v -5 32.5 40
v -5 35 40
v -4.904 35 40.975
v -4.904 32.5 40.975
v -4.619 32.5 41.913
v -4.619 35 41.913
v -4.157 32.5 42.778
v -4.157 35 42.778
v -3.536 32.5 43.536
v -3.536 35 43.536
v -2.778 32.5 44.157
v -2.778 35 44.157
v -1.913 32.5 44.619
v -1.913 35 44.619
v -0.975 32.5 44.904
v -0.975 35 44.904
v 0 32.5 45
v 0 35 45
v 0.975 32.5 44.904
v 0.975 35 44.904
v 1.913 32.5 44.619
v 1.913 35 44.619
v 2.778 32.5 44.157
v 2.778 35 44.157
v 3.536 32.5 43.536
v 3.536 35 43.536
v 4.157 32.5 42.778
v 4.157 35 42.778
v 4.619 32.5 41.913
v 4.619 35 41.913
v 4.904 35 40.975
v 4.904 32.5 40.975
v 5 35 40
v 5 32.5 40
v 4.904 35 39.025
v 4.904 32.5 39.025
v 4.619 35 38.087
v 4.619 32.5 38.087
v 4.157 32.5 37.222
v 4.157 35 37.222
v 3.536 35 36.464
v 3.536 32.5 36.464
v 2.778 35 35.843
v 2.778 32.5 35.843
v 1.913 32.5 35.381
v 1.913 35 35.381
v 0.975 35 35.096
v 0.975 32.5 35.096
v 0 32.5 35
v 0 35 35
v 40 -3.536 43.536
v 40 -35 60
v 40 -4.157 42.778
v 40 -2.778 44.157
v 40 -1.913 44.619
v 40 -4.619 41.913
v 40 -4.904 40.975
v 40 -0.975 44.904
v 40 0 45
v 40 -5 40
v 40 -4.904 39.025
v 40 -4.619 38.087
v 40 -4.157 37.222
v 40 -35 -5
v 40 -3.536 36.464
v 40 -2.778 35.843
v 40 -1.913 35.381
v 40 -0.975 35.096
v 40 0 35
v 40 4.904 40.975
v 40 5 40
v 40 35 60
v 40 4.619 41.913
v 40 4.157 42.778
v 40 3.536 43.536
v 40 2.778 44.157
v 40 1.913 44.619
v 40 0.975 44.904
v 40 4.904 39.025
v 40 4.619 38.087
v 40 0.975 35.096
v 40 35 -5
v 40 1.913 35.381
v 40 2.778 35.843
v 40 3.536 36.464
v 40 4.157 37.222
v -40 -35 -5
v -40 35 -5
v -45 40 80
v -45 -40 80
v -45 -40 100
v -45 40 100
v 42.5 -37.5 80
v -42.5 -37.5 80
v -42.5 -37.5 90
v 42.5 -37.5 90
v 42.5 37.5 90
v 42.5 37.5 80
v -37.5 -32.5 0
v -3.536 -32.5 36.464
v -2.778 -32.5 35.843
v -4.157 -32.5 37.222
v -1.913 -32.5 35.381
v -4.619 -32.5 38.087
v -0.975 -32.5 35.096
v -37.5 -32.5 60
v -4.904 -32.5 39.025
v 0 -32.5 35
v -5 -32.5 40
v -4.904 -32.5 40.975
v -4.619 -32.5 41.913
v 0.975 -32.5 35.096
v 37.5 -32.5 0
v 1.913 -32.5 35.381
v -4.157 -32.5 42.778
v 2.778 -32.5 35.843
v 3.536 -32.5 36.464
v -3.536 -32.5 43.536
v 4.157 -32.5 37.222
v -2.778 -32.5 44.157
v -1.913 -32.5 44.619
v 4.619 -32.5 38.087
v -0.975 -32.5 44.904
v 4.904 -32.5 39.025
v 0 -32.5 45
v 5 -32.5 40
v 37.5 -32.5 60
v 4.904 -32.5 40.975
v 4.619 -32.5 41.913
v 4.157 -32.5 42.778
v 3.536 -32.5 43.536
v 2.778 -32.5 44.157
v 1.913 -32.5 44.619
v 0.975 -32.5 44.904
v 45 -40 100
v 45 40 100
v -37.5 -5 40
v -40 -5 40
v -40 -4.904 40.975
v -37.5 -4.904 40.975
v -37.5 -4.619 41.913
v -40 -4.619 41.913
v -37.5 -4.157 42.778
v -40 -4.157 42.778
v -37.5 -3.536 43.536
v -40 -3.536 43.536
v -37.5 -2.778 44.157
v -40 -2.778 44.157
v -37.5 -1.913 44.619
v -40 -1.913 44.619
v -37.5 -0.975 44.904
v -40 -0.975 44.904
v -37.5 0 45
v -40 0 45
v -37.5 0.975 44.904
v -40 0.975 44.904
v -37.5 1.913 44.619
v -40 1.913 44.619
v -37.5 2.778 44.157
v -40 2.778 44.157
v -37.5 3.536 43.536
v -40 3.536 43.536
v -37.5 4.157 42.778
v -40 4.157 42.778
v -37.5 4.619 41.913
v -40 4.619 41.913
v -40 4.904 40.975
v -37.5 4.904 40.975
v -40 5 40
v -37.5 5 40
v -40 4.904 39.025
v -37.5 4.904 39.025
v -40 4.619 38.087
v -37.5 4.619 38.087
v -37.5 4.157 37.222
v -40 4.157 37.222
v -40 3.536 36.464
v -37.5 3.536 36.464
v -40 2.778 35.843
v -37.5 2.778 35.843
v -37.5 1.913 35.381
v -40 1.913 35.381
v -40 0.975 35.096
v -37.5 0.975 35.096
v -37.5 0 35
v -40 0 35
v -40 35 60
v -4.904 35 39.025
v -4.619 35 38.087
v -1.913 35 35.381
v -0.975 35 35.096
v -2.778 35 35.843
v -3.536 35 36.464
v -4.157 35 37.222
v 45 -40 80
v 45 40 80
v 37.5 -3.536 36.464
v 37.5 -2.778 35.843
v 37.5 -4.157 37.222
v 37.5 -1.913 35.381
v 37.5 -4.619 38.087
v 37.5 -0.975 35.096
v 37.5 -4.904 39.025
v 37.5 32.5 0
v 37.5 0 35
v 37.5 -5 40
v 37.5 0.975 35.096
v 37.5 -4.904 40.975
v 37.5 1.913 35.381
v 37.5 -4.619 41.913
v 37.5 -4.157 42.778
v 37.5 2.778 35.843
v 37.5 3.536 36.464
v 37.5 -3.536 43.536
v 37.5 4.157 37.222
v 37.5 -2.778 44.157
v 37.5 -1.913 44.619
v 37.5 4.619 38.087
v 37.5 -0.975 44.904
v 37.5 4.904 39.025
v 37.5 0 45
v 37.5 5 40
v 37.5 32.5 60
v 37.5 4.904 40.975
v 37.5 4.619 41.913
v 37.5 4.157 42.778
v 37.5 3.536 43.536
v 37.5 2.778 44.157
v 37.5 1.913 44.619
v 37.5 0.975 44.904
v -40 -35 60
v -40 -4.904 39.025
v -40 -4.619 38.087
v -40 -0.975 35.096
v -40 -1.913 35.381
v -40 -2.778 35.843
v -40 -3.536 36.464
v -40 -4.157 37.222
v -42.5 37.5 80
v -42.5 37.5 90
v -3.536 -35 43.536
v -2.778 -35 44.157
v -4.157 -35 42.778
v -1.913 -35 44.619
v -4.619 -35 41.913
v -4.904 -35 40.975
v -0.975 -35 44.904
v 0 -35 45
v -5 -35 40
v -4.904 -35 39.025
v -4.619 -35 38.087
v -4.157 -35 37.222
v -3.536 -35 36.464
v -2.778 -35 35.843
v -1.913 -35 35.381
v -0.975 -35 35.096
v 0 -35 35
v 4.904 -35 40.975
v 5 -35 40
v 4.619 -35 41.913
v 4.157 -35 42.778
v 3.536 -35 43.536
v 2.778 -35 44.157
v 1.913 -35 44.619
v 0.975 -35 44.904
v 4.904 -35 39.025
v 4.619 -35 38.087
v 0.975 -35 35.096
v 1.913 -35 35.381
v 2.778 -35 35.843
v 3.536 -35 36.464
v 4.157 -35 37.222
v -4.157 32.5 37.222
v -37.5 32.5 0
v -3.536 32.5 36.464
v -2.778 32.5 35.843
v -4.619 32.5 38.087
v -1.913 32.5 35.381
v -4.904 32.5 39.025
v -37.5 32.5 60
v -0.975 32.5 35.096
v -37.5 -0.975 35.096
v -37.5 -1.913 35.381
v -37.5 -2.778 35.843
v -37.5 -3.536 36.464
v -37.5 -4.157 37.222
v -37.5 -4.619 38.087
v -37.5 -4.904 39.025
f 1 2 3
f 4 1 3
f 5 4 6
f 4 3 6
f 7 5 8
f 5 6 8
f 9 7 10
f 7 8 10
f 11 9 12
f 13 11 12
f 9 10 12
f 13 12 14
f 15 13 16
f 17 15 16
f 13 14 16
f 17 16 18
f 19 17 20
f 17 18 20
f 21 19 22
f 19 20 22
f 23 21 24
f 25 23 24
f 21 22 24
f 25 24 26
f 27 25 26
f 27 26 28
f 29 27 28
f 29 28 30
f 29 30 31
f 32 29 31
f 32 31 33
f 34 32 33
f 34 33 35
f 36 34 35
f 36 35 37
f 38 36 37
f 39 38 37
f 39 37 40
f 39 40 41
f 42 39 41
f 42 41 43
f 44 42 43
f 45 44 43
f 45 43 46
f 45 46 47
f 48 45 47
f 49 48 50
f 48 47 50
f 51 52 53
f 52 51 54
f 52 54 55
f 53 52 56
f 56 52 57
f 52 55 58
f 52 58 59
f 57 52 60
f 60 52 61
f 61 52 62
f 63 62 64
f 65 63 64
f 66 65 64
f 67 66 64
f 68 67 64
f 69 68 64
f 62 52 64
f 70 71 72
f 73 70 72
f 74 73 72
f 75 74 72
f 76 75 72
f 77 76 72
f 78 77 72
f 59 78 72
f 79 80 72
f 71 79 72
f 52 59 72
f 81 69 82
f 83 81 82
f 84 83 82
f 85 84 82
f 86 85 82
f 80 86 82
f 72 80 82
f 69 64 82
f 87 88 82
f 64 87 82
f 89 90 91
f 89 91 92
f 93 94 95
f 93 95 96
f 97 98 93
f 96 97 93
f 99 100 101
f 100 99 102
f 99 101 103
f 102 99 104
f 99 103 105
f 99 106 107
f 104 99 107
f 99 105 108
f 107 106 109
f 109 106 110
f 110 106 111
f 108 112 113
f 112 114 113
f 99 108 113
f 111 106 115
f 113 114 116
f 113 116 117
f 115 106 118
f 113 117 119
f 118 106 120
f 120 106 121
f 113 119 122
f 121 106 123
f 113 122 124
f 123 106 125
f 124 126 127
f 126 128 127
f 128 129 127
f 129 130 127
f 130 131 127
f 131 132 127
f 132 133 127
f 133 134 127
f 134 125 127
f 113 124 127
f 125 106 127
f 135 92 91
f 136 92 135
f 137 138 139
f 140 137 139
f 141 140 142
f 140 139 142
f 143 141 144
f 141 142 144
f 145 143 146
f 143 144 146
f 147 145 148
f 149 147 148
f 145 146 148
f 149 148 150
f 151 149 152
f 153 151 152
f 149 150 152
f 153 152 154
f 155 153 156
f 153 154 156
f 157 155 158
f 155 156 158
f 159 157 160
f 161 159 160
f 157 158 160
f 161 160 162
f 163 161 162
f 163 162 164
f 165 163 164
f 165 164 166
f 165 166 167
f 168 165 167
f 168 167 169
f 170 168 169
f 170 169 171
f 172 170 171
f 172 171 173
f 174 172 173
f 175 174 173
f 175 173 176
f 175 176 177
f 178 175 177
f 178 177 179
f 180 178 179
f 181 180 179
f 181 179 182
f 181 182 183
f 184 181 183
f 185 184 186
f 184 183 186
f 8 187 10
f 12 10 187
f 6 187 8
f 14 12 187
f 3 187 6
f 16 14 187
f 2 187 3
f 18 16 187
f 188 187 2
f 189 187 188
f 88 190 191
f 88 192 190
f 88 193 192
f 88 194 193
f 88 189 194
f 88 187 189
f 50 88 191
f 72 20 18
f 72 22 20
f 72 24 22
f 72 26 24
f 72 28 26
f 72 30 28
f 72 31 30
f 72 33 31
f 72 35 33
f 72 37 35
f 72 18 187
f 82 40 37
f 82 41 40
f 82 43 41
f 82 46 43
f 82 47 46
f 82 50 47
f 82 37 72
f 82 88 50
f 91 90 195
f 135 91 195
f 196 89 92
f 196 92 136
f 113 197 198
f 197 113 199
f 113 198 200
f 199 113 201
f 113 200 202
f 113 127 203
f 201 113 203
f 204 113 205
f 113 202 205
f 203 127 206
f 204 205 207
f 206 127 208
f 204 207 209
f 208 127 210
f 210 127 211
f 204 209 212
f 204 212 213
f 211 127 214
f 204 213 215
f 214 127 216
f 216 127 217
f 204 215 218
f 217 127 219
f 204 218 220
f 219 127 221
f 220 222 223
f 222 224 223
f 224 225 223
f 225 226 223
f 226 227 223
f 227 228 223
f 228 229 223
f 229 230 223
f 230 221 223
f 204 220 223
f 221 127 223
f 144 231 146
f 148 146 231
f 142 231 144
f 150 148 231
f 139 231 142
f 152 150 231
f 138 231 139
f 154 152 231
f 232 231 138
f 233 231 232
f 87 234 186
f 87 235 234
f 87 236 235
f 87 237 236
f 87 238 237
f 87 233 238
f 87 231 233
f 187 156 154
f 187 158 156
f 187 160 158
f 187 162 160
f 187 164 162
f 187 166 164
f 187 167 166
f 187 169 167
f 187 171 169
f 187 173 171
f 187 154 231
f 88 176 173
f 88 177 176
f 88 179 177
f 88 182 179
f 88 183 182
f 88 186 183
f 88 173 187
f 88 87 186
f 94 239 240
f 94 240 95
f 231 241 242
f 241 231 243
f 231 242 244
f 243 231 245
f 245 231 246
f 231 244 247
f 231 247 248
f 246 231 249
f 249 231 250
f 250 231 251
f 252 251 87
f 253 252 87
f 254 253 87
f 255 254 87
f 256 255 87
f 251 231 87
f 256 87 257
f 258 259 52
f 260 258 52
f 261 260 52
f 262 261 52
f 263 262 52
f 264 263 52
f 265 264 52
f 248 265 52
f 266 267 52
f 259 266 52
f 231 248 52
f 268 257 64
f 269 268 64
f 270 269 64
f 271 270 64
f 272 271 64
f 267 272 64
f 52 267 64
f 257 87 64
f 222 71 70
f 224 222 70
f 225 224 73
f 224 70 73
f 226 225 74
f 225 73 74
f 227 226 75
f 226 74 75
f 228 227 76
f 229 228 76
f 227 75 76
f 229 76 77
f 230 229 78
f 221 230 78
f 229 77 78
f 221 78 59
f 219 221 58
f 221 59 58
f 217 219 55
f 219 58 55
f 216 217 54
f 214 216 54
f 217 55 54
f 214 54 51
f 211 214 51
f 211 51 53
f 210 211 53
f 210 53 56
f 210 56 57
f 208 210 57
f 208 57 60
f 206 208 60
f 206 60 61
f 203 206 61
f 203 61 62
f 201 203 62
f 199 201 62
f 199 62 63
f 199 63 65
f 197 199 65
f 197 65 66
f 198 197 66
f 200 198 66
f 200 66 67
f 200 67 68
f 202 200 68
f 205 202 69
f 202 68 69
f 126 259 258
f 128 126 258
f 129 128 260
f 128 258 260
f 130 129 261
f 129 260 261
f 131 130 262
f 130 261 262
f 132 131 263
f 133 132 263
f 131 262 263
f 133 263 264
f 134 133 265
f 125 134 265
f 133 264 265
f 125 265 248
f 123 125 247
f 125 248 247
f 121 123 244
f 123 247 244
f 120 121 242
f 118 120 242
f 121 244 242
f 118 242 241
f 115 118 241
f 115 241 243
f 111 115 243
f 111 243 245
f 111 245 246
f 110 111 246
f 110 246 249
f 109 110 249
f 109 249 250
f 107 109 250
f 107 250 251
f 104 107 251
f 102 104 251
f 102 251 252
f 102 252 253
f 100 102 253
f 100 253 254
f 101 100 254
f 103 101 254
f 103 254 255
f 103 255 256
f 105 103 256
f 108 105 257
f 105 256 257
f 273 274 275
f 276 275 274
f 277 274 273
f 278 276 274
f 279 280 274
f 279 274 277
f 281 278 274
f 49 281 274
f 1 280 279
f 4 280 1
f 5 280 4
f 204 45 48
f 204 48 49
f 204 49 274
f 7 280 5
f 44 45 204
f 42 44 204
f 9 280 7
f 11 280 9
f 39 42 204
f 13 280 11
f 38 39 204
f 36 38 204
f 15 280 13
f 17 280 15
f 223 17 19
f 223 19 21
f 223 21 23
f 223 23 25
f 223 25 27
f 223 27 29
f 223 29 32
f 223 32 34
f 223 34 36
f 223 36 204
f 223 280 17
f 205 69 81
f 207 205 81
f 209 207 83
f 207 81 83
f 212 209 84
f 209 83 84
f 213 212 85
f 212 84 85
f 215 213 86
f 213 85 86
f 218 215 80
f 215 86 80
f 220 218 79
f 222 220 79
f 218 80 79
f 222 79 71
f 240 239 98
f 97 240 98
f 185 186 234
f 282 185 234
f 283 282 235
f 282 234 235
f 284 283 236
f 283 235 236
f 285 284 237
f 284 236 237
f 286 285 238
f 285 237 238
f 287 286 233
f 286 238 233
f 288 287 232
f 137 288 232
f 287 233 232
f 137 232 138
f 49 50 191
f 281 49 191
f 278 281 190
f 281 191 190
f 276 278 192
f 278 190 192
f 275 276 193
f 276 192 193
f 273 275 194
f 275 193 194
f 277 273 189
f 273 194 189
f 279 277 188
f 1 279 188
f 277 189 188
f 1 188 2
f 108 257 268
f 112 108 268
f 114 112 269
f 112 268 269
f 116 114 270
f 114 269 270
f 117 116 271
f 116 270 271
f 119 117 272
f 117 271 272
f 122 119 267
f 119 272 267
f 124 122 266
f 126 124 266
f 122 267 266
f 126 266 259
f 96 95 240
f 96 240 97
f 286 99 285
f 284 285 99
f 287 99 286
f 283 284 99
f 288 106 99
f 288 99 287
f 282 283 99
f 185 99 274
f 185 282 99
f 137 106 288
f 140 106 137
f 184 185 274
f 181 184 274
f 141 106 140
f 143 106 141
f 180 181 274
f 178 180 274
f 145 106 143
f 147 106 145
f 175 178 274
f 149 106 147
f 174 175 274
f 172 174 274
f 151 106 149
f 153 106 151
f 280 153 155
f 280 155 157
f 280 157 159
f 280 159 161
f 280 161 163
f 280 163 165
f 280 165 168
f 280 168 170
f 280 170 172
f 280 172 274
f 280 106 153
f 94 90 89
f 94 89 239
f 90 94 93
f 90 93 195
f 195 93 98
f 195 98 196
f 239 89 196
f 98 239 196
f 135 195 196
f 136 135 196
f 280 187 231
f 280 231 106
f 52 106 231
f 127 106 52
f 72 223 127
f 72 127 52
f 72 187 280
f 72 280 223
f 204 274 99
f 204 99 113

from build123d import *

# Parameters (mm, degrees)
F0_W      = 80
F0_H      = 70
F0_W_2    = 53
F0_H_2    = 53
F1_DEPTH  = 5
F2_DEPTH  = 60
F3_W      = 90
F3_H      = 80
F4_DEPTH  = 40
F3_W_2    = 80
F3_H_2    = 70
F5_DEPTH  = 20
F6_W      = 85
F6_H      = 75
F7_DEPTH  = 10
F8_W      = 75
F8_H      = 65
F9_DEPTH  = 60
F11_DEPTH = 5
F13_DEPTH = 5
F15_DEPTH = 5
F17_DEPTH = 5


with BuildPart() as f1:
    # F0 (on Top) → F1 (new body)
    with BuildSketch(Plane.XY):
        Rectangle(F0_W, F0_H)
        Rectangle(F0_W_2, F0_H_2, mode=Mode.SUBTRACT)
        Rectangle(F0_W_2, F0_H_2)
    extrude(amount=-F1_DEPTH)

    # F0 (on Top) → F2 (join)
    with BuildSketch(Plane.XY):
        Rectangle(F0_W, F0_H)
        Rectangle(F0_W_2, F0_H_2, mode=Mode.SUBTRACT)
    extrude(amount=F2_DEPTH)

    # F3 (on face) → F4 (join)
    with BuildSketch(Plane.XY.offset(60)):
        Rectangle(F3_W, F3_H)
    extrude(amount=F4_DEPTH)

    # F3 (on face) → F5 (cut)
    with BuildSketch(Plane.XY.offset(60)):
        Rectangle(F3_W, F3_H)
        Rectangle(F3_W_2, F3_H_2, mode=Mode.SUBTRACT)
        Rectangle(F3_W, F3_H)
    extrude(amount=F5_DEPTH, mode=Mode.SUBTRACT)

    # F6 (on face) → F7 (cut)
    with BuildSketch(Plane(origin=(0, 0, 80), x_dir=(1, 0, 0), z_dir=(0, 0, -1))):
        Rectangle(F6_W, F6_H)
    extrude(amount=-F7_DEPTH, mode=Mode.SUBTRACT)

    # F8 (on face) → F9 (cut)
    with BuildSketch(Plane.XY.offset(60)):
        Rectangle(F8_W, F8_H)
    extrude(amount=-F9_DEPTH, mode=Mode.SUBTRACT)

    # F10 (on face) → F11 (cut)
    with BuildSketch(Plane(origin=(-40, 0, 0), x_dir=(0, -1, 0), z_dir=(-1, 0, 0))):
        with BuildLine():
            ThreePointArc((0, 35), (3.5355339059, 36.4644660941), (5, 40))
            ThreePointArc((5, 40), (-3.5355339059, 43.5355339059), (0, 35))
        make_face()
    extrude(amount=-F11_DEPTH, mode=Mode.SUBTRACT)

    # F12 (on face) → F13 (cut)
    with BuildSketch(Plane.YZ.offset(40)):
        with BuildLine():
            ThreePointArc((0, 35), (3.5355339059, 36.4644660941), (5, 40))
            ThreePointArc((5, 40), (-3.5355339059, 43.5355339059), (0, 35))
        make_face()
    extrude(amount=-F13_DEPTH, mode=Mode.SUBTRACT)

    # F14 (on face) → F15 (cut)
    with BuildSketch(Plane(origin=(0, 35, 0), x_dir=(-1, 0, 0), z_dir=(0, 1, 0))):
        with BuildLine():
            ThreePointArc((0, 35), (3.5355339059, 36.4644660941), (5, 40))
            ThreePointArc((5, 40), (-3.5355339059, 43.5355339059), (0, 35))
        make_face()
    extrude(amount=-F15_DEPTH, mode=Mode.SUBTRACT)

    # F16 (on face) → F17 (cut)
    with BuildSketch(Plane.XZ.offset(35)):
        with BuildLine():
            ThreePointArc((0, 35), (3.5355339059, 36.4644660941), (5, 40))
            ThreePointArc((5, 40), (-3.5355339059, 43.5355339059), (0, 35))
        make_face()
    extrude(amount=-F17_DEPTH, mode=Mode.SUBTRACT)


solid = f1.part
